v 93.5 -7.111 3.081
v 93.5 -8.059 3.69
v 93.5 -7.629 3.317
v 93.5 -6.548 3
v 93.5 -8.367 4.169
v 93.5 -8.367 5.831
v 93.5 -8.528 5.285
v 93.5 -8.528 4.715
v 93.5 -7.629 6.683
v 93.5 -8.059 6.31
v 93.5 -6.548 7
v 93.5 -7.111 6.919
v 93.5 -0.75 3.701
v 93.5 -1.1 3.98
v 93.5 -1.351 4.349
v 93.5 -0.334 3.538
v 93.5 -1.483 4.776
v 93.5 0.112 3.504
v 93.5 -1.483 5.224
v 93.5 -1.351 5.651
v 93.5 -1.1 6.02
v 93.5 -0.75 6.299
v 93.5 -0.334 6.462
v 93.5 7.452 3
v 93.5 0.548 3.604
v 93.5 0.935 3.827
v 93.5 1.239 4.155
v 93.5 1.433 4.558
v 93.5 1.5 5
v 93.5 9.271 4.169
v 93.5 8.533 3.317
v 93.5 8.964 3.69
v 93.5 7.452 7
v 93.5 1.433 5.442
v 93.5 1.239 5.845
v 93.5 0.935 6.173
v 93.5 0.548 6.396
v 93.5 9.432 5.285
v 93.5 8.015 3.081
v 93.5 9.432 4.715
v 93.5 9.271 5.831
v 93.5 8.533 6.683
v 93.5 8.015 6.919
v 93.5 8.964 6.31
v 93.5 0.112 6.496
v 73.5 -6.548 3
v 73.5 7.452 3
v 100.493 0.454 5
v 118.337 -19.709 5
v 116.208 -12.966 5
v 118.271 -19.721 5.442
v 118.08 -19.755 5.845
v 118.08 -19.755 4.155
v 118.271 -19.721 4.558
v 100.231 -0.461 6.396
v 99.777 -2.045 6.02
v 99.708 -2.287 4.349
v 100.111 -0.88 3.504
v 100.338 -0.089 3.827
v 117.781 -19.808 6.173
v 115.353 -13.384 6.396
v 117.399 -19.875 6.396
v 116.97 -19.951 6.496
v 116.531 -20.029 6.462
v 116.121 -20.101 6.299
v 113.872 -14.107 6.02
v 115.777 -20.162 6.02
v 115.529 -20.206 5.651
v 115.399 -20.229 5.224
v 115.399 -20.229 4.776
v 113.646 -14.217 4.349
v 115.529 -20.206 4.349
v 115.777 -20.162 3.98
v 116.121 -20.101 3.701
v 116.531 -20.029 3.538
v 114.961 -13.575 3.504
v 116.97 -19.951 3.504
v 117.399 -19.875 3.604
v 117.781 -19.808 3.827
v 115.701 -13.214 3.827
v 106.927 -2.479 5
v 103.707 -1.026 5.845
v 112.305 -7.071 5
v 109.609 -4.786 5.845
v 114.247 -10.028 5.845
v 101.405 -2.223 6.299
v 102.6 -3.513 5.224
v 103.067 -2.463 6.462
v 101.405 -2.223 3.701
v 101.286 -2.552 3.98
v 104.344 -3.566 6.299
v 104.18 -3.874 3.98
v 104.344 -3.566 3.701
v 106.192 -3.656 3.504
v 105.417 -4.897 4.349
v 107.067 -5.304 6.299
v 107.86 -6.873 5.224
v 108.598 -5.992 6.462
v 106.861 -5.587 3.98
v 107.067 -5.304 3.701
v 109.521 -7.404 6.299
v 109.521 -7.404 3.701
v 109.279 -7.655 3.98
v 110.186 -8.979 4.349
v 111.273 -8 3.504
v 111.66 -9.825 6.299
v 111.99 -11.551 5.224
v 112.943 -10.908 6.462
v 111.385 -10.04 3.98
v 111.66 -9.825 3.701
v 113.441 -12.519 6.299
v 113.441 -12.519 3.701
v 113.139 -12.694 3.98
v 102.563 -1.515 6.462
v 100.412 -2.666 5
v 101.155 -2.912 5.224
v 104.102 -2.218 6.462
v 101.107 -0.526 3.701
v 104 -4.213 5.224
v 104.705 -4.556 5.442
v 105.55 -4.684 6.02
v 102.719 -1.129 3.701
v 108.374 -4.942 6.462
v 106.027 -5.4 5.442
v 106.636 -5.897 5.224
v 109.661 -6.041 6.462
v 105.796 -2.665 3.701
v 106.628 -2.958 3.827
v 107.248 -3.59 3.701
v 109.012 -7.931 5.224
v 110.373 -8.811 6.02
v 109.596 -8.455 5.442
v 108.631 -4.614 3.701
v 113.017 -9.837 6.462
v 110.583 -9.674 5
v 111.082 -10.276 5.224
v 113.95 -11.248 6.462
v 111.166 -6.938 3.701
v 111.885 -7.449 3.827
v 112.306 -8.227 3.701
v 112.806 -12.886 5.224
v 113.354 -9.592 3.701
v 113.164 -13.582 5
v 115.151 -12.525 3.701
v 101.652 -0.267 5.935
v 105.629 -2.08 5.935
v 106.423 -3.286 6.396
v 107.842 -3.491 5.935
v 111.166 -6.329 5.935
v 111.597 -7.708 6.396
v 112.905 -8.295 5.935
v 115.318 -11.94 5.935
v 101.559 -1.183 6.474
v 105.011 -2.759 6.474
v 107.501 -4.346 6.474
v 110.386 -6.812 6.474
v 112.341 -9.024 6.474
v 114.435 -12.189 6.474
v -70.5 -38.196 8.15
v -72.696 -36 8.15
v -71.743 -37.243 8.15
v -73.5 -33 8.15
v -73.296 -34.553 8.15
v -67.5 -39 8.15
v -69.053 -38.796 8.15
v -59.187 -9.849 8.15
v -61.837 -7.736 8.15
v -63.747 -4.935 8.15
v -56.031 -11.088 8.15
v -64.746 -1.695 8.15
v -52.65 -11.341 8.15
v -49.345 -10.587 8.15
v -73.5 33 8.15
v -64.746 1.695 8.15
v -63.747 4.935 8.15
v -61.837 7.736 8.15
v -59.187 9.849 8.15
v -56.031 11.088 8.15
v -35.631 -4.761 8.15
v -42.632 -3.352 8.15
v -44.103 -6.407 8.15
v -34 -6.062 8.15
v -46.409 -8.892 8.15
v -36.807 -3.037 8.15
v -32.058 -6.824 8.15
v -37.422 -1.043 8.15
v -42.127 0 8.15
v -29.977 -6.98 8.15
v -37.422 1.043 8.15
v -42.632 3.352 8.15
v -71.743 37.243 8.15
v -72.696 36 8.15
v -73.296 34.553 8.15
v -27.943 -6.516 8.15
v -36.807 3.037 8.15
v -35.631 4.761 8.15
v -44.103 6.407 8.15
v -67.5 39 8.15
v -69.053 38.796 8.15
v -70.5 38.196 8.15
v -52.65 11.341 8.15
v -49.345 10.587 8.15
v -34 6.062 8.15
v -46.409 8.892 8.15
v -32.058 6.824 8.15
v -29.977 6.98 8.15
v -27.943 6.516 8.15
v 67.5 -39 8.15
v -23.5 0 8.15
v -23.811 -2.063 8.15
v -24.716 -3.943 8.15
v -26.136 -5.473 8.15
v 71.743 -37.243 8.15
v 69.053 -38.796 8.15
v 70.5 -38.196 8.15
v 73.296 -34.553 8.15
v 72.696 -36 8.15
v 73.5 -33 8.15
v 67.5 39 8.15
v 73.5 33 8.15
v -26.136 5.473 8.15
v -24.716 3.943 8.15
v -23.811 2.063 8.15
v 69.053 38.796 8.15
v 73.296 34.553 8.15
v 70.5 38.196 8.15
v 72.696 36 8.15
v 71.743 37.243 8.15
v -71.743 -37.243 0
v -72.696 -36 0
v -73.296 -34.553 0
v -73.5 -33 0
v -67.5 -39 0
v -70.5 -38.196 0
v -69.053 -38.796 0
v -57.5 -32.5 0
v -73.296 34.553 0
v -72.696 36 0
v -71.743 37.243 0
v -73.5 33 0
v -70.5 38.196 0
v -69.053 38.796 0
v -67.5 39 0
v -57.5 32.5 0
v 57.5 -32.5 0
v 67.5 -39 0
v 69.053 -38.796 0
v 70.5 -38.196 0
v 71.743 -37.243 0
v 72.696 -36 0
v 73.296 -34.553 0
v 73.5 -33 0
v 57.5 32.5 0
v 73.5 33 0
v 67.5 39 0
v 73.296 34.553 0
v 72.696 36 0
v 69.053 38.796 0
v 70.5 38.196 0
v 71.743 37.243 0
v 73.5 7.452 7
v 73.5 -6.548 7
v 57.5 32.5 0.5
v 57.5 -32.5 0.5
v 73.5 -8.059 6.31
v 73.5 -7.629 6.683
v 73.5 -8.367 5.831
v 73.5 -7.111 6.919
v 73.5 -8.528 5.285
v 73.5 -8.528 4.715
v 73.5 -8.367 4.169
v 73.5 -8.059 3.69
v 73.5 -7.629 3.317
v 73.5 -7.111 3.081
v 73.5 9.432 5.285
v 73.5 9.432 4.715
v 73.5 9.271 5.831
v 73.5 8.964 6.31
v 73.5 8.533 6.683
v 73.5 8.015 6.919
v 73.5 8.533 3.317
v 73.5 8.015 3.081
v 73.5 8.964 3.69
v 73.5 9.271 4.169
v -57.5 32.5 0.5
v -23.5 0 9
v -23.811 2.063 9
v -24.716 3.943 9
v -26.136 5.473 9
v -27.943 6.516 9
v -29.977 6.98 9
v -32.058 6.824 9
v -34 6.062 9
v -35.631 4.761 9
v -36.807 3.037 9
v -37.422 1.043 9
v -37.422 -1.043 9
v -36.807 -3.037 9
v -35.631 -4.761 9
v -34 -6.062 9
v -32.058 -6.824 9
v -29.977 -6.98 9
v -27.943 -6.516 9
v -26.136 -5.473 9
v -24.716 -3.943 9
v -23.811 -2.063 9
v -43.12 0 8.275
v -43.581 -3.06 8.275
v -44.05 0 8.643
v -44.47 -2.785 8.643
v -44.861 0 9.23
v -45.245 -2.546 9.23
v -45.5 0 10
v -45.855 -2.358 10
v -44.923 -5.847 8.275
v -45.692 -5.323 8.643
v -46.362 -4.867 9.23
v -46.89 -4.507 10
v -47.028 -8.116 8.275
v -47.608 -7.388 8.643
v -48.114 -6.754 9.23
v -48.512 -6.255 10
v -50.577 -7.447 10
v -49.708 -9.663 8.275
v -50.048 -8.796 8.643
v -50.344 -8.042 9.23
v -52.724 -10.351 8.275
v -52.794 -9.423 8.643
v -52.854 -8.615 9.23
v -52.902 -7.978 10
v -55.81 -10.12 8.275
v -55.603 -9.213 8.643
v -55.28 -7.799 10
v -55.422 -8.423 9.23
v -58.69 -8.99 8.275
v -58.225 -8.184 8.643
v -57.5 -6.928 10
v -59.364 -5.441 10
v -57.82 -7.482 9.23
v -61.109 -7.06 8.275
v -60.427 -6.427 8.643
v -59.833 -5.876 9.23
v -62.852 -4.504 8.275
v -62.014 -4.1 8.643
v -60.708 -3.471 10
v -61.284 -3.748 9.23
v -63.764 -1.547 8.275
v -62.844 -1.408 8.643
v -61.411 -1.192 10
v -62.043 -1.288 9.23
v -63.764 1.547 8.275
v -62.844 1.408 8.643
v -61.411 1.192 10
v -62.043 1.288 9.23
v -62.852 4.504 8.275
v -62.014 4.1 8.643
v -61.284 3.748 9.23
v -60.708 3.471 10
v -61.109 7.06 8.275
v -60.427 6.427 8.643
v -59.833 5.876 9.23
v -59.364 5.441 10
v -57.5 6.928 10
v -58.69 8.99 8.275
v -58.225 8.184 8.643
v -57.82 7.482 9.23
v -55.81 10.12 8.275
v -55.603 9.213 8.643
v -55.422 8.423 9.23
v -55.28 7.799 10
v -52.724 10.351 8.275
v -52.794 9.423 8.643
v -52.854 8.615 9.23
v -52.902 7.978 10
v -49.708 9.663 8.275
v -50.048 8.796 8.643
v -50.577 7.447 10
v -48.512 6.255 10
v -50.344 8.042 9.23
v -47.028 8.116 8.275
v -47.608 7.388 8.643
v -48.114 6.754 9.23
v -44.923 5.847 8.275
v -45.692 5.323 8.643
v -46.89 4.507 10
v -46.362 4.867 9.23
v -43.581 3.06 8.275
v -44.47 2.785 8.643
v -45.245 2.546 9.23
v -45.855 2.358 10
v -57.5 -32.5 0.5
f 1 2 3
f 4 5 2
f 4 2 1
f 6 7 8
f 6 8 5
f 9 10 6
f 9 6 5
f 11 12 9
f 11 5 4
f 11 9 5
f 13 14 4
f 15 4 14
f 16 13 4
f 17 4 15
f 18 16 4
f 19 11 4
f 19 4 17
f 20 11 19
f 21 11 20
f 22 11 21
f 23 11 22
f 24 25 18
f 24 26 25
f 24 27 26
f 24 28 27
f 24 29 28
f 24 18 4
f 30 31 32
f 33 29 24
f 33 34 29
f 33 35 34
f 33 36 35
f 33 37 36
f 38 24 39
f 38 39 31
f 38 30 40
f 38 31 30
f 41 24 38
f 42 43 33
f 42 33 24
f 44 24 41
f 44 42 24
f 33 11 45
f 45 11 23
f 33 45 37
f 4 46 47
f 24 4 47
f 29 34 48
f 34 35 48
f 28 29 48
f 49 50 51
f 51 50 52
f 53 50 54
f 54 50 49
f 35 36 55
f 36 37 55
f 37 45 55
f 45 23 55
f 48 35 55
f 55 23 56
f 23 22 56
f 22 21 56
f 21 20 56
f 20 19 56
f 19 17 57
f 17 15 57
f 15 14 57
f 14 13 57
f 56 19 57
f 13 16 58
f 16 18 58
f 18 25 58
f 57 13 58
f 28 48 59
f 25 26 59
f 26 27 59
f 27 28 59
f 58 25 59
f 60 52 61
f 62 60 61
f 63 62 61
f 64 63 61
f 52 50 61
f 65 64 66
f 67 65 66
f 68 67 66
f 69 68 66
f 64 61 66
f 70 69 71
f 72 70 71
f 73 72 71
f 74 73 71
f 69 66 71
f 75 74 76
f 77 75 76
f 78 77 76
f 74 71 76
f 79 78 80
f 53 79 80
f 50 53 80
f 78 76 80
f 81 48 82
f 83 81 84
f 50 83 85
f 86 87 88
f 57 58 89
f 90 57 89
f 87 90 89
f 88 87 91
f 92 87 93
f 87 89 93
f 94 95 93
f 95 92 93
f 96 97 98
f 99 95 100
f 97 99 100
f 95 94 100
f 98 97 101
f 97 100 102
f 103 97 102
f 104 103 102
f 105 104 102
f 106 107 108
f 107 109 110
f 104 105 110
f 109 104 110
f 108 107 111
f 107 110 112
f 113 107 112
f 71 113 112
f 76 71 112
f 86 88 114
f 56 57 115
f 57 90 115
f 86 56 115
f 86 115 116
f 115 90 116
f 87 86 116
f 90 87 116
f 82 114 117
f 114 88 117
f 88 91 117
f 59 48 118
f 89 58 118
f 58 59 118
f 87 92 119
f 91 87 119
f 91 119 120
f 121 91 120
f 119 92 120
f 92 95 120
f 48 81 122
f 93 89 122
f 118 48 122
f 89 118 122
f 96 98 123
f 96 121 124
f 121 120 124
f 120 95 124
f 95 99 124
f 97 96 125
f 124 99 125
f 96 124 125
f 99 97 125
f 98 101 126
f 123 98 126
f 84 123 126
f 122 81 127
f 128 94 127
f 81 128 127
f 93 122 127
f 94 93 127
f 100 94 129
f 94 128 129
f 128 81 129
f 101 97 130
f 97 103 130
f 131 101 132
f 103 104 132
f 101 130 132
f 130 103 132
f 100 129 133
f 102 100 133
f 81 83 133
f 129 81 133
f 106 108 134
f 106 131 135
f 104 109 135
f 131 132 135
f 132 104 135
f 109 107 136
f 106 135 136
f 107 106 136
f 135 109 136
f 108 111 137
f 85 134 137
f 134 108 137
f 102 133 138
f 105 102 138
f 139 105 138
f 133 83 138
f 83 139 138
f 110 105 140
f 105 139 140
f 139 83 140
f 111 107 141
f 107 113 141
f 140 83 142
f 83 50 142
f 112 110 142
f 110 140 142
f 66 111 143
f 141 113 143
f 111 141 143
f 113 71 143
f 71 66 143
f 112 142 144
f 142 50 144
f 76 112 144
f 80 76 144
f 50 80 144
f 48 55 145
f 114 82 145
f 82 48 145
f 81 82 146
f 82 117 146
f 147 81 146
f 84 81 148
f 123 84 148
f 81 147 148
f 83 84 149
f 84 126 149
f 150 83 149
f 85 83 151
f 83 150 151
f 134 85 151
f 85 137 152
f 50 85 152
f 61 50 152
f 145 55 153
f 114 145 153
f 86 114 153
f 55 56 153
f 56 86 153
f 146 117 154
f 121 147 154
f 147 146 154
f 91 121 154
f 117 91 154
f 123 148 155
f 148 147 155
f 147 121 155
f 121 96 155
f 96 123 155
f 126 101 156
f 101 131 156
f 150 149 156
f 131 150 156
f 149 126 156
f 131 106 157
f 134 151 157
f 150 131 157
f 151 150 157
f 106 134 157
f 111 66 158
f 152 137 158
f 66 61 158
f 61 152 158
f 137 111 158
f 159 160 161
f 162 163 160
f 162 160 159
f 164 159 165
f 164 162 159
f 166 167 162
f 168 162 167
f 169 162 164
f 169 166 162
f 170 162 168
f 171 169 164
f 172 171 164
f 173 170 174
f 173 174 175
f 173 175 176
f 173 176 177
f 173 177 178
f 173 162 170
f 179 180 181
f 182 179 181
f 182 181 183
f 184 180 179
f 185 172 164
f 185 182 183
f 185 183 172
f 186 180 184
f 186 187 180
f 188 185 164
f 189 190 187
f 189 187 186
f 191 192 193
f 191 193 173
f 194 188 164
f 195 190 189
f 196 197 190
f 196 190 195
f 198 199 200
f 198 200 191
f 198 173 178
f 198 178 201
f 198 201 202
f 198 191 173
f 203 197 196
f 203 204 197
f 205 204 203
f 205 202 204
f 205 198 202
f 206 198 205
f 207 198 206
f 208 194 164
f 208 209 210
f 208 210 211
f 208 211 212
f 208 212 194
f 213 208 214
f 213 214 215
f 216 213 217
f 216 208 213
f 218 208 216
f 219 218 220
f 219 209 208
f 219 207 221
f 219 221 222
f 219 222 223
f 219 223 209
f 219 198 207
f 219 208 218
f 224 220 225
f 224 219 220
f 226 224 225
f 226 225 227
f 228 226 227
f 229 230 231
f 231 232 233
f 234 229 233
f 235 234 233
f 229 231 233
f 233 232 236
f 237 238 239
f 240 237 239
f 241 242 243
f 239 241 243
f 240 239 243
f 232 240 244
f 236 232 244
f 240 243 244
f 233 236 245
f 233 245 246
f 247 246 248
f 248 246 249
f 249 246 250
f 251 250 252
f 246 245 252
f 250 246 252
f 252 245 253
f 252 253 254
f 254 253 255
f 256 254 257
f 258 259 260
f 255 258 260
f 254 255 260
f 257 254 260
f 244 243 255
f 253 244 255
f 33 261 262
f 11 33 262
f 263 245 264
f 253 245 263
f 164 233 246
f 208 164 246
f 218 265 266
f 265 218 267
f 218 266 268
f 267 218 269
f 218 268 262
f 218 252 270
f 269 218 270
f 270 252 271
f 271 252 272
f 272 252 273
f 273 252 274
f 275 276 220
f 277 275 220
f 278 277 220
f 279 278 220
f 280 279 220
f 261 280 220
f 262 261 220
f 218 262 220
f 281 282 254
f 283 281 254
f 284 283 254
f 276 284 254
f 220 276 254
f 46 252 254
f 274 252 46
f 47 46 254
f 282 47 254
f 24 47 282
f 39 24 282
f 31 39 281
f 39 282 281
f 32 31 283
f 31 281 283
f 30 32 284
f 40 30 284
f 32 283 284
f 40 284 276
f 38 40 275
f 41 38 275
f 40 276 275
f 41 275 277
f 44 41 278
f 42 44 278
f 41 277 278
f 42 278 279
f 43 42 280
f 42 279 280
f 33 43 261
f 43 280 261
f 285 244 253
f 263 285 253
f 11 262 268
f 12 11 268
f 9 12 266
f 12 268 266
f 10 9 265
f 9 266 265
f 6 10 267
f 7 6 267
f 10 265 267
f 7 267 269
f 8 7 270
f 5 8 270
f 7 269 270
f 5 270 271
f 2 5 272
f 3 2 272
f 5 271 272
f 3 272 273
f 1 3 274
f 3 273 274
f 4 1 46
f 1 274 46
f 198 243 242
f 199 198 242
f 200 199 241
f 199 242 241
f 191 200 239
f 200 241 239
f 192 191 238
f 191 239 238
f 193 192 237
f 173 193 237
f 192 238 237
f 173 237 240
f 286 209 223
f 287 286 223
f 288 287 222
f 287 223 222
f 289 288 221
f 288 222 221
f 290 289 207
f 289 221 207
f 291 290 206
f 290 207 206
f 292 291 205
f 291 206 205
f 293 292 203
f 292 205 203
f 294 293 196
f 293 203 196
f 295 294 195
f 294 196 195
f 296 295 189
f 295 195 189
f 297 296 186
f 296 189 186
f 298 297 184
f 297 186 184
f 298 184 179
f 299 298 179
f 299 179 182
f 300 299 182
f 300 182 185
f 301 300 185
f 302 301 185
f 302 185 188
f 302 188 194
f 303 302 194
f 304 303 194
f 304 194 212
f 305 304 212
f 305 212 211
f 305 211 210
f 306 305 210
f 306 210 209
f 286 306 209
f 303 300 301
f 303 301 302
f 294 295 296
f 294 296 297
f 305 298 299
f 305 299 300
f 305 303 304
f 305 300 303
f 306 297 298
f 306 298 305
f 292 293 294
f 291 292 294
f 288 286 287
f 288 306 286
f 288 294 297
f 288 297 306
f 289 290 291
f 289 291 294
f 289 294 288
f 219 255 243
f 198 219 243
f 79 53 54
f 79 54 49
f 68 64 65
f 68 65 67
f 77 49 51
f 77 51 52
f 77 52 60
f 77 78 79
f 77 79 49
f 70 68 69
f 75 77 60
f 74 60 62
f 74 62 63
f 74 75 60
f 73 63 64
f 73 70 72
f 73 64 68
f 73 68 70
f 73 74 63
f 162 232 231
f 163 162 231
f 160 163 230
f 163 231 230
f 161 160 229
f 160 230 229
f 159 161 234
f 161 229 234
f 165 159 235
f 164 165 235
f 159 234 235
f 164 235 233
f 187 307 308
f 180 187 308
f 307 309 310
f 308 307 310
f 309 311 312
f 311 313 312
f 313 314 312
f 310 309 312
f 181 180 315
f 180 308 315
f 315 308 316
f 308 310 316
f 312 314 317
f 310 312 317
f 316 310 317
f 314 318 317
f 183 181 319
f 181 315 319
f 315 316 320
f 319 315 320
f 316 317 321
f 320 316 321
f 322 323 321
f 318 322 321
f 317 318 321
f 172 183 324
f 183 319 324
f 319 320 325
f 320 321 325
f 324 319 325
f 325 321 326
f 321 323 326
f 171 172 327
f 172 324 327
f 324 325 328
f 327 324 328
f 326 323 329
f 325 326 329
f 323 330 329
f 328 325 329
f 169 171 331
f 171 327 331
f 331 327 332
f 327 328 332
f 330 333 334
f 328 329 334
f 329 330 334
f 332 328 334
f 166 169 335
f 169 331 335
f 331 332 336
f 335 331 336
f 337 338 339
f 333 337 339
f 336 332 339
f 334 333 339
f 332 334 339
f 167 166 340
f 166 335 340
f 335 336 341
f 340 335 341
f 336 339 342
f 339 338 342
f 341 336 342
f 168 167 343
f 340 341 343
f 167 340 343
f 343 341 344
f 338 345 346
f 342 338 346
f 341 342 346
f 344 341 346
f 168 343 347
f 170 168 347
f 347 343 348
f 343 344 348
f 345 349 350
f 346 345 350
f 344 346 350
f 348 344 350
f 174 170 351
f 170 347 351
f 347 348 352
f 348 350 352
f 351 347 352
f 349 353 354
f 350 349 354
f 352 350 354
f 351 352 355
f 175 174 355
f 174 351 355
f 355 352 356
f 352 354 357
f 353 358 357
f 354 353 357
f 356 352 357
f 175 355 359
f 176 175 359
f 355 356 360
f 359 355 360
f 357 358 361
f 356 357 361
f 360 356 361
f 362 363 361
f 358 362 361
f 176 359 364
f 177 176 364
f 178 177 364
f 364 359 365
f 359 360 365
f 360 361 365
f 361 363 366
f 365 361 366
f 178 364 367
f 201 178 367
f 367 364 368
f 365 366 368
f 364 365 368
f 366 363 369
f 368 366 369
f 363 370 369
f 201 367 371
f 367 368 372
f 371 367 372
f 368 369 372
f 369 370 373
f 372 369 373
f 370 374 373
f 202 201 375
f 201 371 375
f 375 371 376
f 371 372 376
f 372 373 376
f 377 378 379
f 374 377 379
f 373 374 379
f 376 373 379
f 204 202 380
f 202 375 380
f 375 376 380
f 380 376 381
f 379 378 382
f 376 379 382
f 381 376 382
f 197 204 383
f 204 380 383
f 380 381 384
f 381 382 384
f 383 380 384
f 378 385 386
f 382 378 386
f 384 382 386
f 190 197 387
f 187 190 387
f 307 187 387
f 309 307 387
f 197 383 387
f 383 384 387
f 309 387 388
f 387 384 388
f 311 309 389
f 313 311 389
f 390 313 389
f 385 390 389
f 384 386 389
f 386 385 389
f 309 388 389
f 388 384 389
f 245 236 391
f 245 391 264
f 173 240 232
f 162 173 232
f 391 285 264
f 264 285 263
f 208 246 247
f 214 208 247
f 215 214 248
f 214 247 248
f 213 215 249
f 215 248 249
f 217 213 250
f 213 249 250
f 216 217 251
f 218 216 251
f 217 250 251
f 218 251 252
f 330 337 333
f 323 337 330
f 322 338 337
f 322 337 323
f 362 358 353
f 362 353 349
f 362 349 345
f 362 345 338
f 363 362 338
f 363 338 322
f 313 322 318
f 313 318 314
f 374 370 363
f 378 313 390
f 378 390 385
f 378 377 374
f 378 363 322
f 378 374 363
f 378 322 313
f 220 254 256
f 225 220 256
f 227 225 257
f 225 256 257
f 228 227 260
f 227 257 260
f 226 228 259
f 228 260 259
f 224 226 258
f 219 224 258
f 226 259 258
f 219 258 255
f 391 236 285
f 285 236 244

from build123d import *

# Parameters (mm, degrees)
F0_R     = 8
F0_R_2   = 7
F1_DEPTH = 8.15
F2_DEPTH = 10
F3_DEPTH = 9
F5_W     = 115
F5_H     = 65
F6_DEPTH = 0.5
F8_DEPTH = 20
F11_R    = 1.5


# Not quite as in the source:
# - a fillet or chamfer that OpenCascade refuses, or shapes differently, is made with other operations: its cross-section is extruded or revolved along the edge and cut away or added


with BuildPart() as f1:
    # F0 (on Top) → F1 (new body)
    with BuildSketch(Plane.XY):
        with BuildLine():
            Line((-67.5, -39), (67.5, -39))
            ThreePointArc((67.5, -39), (71.7426406871, -37.2426406871), (73.5, -33))
            Line((73.5, -33), (73.5, 33))
            ThreePointArc((73.5, 33), (71.7426406871, 37.2426406871), (67.5, 39))
            Line((67.5, 39), (-67.5, 39))
            ThreePointArc((-67.5, 39), (-71.7426406871, 37.2426406871), (-73.5, 33))
            Line((-73.5, 33), (-73.5, -33))
            ThreePointArc((-73.5, -33), (-71.7426406871, -37.2426406871), (-67.5, -39))
        make_face()
        with Locations((-53.5, 0)):
            Circle(F0_R, mode=Mode.SUBTRACT)
        with Locations((-30.5, 0)):
            Circle(F0_R_2, mode=Mode.SUBTRACT)
        with Locations((-53.5, 0)):
            Circle(F0_R)
        with Locations((-30.5, 0)):
            Circle(F0_R_2)
    extrude(amount=F1_DEPTH)

    # F0 (on Top) → F2 (join)
    with BuildSketch(Plane.XY):
        with Locations((-53.5, 0)):
            Circle(F0_R)
    extrude(amount=F2_DEPTH)

    # F0 (on Top) → F3 (join)
    with BuildSketch(Plane.XY):
        with Locations((-30.5, 0)):
            Circle(F0_R_2)
    extrude(amount=F3_DEPTH)

    # F4: fillet of radius 4 on 1 edges, made by hand

    # F4_s1 → F4_t2 (revolve)
    with BuildSketch(Plane.XZ):
        with BuildLine():
            ThreePointArc((-42.1269450049, 8.15), (-44.0504834111, 8.6428644167), (-45.5, 10))
            Line((-45.5, 10), (-45.5, 8.15))
            Line((-45.5, 8.15), (-42.1269450049, 8.15))
        make_face()
    revolve(axis=Axis((-53.5, 0, 8.15), (0, 0, -1)))

    # F5 (on Top) → F6 (cut)
    with BuildSketch(Plane.XY):
        Rectangle(F5_W, F5_H)
    extrude(amount=F6_DEPTH, mode=Mode.SUBTRACT)

    # F7 (on face) → F8 (join)
    with BuildSketch(Plane.YZ.offset(73.5)):
        with BuildLine():
            ThreePointArc((7.4520160146, 3), (9.4520160146, 5), (7.4520160146, 7))
            Line((7.4520160146, 7), (-6.5479839854, 7))
            ThreePointArc((-6.5479839854, 7), (-8.5479839854, 5), (-6.5479839854, 3))
            Line((-6.5479839854, 3), (7.4520160146, 3))
        make_face()
        with BuildLine():
            ThreePointArc((-1.5, 5), (0, 6.5), (1.5, 5))
            ThreePointArc((1.5, 5), (0, 3.5), (-1.5, 5))
        make_face(mode=Mode.SUBTRACT)
        with BuildLine():
            Line((-1.5, 5), (1.5, 5))
            ThreePointArc((1.5, 5), (0, 6.5), (-1.5, 5))
        make_face()
        with BuildLine():
            ThreePointArc((-1.5, 5), (0, 3.5), (1.5, 5))
            Line((1.5, 5), (-1.5, 5))
        make_face()
    extrude(amount=F8_DEPTH)

    # F12: sweep along a path in F10
    with BuildLine(Plane(origin=(0, 0, 5), x_dir=(1, 0, 0), z_dir=(0, 0, -1))) as f12_path:
        ThreePointArc((93.5, 0), (108.8125986956, 5.7360841116), (116.8597106736, 19.970631121))
    # F11 (on face) → F12 (sweep)
    with BuildSketch(Plane.YZ.offset(93.5)):
        with Locations((0, 5)):
            Circle(F11_R)
    sweep(path=f12_path.line)


solid = f1.part
